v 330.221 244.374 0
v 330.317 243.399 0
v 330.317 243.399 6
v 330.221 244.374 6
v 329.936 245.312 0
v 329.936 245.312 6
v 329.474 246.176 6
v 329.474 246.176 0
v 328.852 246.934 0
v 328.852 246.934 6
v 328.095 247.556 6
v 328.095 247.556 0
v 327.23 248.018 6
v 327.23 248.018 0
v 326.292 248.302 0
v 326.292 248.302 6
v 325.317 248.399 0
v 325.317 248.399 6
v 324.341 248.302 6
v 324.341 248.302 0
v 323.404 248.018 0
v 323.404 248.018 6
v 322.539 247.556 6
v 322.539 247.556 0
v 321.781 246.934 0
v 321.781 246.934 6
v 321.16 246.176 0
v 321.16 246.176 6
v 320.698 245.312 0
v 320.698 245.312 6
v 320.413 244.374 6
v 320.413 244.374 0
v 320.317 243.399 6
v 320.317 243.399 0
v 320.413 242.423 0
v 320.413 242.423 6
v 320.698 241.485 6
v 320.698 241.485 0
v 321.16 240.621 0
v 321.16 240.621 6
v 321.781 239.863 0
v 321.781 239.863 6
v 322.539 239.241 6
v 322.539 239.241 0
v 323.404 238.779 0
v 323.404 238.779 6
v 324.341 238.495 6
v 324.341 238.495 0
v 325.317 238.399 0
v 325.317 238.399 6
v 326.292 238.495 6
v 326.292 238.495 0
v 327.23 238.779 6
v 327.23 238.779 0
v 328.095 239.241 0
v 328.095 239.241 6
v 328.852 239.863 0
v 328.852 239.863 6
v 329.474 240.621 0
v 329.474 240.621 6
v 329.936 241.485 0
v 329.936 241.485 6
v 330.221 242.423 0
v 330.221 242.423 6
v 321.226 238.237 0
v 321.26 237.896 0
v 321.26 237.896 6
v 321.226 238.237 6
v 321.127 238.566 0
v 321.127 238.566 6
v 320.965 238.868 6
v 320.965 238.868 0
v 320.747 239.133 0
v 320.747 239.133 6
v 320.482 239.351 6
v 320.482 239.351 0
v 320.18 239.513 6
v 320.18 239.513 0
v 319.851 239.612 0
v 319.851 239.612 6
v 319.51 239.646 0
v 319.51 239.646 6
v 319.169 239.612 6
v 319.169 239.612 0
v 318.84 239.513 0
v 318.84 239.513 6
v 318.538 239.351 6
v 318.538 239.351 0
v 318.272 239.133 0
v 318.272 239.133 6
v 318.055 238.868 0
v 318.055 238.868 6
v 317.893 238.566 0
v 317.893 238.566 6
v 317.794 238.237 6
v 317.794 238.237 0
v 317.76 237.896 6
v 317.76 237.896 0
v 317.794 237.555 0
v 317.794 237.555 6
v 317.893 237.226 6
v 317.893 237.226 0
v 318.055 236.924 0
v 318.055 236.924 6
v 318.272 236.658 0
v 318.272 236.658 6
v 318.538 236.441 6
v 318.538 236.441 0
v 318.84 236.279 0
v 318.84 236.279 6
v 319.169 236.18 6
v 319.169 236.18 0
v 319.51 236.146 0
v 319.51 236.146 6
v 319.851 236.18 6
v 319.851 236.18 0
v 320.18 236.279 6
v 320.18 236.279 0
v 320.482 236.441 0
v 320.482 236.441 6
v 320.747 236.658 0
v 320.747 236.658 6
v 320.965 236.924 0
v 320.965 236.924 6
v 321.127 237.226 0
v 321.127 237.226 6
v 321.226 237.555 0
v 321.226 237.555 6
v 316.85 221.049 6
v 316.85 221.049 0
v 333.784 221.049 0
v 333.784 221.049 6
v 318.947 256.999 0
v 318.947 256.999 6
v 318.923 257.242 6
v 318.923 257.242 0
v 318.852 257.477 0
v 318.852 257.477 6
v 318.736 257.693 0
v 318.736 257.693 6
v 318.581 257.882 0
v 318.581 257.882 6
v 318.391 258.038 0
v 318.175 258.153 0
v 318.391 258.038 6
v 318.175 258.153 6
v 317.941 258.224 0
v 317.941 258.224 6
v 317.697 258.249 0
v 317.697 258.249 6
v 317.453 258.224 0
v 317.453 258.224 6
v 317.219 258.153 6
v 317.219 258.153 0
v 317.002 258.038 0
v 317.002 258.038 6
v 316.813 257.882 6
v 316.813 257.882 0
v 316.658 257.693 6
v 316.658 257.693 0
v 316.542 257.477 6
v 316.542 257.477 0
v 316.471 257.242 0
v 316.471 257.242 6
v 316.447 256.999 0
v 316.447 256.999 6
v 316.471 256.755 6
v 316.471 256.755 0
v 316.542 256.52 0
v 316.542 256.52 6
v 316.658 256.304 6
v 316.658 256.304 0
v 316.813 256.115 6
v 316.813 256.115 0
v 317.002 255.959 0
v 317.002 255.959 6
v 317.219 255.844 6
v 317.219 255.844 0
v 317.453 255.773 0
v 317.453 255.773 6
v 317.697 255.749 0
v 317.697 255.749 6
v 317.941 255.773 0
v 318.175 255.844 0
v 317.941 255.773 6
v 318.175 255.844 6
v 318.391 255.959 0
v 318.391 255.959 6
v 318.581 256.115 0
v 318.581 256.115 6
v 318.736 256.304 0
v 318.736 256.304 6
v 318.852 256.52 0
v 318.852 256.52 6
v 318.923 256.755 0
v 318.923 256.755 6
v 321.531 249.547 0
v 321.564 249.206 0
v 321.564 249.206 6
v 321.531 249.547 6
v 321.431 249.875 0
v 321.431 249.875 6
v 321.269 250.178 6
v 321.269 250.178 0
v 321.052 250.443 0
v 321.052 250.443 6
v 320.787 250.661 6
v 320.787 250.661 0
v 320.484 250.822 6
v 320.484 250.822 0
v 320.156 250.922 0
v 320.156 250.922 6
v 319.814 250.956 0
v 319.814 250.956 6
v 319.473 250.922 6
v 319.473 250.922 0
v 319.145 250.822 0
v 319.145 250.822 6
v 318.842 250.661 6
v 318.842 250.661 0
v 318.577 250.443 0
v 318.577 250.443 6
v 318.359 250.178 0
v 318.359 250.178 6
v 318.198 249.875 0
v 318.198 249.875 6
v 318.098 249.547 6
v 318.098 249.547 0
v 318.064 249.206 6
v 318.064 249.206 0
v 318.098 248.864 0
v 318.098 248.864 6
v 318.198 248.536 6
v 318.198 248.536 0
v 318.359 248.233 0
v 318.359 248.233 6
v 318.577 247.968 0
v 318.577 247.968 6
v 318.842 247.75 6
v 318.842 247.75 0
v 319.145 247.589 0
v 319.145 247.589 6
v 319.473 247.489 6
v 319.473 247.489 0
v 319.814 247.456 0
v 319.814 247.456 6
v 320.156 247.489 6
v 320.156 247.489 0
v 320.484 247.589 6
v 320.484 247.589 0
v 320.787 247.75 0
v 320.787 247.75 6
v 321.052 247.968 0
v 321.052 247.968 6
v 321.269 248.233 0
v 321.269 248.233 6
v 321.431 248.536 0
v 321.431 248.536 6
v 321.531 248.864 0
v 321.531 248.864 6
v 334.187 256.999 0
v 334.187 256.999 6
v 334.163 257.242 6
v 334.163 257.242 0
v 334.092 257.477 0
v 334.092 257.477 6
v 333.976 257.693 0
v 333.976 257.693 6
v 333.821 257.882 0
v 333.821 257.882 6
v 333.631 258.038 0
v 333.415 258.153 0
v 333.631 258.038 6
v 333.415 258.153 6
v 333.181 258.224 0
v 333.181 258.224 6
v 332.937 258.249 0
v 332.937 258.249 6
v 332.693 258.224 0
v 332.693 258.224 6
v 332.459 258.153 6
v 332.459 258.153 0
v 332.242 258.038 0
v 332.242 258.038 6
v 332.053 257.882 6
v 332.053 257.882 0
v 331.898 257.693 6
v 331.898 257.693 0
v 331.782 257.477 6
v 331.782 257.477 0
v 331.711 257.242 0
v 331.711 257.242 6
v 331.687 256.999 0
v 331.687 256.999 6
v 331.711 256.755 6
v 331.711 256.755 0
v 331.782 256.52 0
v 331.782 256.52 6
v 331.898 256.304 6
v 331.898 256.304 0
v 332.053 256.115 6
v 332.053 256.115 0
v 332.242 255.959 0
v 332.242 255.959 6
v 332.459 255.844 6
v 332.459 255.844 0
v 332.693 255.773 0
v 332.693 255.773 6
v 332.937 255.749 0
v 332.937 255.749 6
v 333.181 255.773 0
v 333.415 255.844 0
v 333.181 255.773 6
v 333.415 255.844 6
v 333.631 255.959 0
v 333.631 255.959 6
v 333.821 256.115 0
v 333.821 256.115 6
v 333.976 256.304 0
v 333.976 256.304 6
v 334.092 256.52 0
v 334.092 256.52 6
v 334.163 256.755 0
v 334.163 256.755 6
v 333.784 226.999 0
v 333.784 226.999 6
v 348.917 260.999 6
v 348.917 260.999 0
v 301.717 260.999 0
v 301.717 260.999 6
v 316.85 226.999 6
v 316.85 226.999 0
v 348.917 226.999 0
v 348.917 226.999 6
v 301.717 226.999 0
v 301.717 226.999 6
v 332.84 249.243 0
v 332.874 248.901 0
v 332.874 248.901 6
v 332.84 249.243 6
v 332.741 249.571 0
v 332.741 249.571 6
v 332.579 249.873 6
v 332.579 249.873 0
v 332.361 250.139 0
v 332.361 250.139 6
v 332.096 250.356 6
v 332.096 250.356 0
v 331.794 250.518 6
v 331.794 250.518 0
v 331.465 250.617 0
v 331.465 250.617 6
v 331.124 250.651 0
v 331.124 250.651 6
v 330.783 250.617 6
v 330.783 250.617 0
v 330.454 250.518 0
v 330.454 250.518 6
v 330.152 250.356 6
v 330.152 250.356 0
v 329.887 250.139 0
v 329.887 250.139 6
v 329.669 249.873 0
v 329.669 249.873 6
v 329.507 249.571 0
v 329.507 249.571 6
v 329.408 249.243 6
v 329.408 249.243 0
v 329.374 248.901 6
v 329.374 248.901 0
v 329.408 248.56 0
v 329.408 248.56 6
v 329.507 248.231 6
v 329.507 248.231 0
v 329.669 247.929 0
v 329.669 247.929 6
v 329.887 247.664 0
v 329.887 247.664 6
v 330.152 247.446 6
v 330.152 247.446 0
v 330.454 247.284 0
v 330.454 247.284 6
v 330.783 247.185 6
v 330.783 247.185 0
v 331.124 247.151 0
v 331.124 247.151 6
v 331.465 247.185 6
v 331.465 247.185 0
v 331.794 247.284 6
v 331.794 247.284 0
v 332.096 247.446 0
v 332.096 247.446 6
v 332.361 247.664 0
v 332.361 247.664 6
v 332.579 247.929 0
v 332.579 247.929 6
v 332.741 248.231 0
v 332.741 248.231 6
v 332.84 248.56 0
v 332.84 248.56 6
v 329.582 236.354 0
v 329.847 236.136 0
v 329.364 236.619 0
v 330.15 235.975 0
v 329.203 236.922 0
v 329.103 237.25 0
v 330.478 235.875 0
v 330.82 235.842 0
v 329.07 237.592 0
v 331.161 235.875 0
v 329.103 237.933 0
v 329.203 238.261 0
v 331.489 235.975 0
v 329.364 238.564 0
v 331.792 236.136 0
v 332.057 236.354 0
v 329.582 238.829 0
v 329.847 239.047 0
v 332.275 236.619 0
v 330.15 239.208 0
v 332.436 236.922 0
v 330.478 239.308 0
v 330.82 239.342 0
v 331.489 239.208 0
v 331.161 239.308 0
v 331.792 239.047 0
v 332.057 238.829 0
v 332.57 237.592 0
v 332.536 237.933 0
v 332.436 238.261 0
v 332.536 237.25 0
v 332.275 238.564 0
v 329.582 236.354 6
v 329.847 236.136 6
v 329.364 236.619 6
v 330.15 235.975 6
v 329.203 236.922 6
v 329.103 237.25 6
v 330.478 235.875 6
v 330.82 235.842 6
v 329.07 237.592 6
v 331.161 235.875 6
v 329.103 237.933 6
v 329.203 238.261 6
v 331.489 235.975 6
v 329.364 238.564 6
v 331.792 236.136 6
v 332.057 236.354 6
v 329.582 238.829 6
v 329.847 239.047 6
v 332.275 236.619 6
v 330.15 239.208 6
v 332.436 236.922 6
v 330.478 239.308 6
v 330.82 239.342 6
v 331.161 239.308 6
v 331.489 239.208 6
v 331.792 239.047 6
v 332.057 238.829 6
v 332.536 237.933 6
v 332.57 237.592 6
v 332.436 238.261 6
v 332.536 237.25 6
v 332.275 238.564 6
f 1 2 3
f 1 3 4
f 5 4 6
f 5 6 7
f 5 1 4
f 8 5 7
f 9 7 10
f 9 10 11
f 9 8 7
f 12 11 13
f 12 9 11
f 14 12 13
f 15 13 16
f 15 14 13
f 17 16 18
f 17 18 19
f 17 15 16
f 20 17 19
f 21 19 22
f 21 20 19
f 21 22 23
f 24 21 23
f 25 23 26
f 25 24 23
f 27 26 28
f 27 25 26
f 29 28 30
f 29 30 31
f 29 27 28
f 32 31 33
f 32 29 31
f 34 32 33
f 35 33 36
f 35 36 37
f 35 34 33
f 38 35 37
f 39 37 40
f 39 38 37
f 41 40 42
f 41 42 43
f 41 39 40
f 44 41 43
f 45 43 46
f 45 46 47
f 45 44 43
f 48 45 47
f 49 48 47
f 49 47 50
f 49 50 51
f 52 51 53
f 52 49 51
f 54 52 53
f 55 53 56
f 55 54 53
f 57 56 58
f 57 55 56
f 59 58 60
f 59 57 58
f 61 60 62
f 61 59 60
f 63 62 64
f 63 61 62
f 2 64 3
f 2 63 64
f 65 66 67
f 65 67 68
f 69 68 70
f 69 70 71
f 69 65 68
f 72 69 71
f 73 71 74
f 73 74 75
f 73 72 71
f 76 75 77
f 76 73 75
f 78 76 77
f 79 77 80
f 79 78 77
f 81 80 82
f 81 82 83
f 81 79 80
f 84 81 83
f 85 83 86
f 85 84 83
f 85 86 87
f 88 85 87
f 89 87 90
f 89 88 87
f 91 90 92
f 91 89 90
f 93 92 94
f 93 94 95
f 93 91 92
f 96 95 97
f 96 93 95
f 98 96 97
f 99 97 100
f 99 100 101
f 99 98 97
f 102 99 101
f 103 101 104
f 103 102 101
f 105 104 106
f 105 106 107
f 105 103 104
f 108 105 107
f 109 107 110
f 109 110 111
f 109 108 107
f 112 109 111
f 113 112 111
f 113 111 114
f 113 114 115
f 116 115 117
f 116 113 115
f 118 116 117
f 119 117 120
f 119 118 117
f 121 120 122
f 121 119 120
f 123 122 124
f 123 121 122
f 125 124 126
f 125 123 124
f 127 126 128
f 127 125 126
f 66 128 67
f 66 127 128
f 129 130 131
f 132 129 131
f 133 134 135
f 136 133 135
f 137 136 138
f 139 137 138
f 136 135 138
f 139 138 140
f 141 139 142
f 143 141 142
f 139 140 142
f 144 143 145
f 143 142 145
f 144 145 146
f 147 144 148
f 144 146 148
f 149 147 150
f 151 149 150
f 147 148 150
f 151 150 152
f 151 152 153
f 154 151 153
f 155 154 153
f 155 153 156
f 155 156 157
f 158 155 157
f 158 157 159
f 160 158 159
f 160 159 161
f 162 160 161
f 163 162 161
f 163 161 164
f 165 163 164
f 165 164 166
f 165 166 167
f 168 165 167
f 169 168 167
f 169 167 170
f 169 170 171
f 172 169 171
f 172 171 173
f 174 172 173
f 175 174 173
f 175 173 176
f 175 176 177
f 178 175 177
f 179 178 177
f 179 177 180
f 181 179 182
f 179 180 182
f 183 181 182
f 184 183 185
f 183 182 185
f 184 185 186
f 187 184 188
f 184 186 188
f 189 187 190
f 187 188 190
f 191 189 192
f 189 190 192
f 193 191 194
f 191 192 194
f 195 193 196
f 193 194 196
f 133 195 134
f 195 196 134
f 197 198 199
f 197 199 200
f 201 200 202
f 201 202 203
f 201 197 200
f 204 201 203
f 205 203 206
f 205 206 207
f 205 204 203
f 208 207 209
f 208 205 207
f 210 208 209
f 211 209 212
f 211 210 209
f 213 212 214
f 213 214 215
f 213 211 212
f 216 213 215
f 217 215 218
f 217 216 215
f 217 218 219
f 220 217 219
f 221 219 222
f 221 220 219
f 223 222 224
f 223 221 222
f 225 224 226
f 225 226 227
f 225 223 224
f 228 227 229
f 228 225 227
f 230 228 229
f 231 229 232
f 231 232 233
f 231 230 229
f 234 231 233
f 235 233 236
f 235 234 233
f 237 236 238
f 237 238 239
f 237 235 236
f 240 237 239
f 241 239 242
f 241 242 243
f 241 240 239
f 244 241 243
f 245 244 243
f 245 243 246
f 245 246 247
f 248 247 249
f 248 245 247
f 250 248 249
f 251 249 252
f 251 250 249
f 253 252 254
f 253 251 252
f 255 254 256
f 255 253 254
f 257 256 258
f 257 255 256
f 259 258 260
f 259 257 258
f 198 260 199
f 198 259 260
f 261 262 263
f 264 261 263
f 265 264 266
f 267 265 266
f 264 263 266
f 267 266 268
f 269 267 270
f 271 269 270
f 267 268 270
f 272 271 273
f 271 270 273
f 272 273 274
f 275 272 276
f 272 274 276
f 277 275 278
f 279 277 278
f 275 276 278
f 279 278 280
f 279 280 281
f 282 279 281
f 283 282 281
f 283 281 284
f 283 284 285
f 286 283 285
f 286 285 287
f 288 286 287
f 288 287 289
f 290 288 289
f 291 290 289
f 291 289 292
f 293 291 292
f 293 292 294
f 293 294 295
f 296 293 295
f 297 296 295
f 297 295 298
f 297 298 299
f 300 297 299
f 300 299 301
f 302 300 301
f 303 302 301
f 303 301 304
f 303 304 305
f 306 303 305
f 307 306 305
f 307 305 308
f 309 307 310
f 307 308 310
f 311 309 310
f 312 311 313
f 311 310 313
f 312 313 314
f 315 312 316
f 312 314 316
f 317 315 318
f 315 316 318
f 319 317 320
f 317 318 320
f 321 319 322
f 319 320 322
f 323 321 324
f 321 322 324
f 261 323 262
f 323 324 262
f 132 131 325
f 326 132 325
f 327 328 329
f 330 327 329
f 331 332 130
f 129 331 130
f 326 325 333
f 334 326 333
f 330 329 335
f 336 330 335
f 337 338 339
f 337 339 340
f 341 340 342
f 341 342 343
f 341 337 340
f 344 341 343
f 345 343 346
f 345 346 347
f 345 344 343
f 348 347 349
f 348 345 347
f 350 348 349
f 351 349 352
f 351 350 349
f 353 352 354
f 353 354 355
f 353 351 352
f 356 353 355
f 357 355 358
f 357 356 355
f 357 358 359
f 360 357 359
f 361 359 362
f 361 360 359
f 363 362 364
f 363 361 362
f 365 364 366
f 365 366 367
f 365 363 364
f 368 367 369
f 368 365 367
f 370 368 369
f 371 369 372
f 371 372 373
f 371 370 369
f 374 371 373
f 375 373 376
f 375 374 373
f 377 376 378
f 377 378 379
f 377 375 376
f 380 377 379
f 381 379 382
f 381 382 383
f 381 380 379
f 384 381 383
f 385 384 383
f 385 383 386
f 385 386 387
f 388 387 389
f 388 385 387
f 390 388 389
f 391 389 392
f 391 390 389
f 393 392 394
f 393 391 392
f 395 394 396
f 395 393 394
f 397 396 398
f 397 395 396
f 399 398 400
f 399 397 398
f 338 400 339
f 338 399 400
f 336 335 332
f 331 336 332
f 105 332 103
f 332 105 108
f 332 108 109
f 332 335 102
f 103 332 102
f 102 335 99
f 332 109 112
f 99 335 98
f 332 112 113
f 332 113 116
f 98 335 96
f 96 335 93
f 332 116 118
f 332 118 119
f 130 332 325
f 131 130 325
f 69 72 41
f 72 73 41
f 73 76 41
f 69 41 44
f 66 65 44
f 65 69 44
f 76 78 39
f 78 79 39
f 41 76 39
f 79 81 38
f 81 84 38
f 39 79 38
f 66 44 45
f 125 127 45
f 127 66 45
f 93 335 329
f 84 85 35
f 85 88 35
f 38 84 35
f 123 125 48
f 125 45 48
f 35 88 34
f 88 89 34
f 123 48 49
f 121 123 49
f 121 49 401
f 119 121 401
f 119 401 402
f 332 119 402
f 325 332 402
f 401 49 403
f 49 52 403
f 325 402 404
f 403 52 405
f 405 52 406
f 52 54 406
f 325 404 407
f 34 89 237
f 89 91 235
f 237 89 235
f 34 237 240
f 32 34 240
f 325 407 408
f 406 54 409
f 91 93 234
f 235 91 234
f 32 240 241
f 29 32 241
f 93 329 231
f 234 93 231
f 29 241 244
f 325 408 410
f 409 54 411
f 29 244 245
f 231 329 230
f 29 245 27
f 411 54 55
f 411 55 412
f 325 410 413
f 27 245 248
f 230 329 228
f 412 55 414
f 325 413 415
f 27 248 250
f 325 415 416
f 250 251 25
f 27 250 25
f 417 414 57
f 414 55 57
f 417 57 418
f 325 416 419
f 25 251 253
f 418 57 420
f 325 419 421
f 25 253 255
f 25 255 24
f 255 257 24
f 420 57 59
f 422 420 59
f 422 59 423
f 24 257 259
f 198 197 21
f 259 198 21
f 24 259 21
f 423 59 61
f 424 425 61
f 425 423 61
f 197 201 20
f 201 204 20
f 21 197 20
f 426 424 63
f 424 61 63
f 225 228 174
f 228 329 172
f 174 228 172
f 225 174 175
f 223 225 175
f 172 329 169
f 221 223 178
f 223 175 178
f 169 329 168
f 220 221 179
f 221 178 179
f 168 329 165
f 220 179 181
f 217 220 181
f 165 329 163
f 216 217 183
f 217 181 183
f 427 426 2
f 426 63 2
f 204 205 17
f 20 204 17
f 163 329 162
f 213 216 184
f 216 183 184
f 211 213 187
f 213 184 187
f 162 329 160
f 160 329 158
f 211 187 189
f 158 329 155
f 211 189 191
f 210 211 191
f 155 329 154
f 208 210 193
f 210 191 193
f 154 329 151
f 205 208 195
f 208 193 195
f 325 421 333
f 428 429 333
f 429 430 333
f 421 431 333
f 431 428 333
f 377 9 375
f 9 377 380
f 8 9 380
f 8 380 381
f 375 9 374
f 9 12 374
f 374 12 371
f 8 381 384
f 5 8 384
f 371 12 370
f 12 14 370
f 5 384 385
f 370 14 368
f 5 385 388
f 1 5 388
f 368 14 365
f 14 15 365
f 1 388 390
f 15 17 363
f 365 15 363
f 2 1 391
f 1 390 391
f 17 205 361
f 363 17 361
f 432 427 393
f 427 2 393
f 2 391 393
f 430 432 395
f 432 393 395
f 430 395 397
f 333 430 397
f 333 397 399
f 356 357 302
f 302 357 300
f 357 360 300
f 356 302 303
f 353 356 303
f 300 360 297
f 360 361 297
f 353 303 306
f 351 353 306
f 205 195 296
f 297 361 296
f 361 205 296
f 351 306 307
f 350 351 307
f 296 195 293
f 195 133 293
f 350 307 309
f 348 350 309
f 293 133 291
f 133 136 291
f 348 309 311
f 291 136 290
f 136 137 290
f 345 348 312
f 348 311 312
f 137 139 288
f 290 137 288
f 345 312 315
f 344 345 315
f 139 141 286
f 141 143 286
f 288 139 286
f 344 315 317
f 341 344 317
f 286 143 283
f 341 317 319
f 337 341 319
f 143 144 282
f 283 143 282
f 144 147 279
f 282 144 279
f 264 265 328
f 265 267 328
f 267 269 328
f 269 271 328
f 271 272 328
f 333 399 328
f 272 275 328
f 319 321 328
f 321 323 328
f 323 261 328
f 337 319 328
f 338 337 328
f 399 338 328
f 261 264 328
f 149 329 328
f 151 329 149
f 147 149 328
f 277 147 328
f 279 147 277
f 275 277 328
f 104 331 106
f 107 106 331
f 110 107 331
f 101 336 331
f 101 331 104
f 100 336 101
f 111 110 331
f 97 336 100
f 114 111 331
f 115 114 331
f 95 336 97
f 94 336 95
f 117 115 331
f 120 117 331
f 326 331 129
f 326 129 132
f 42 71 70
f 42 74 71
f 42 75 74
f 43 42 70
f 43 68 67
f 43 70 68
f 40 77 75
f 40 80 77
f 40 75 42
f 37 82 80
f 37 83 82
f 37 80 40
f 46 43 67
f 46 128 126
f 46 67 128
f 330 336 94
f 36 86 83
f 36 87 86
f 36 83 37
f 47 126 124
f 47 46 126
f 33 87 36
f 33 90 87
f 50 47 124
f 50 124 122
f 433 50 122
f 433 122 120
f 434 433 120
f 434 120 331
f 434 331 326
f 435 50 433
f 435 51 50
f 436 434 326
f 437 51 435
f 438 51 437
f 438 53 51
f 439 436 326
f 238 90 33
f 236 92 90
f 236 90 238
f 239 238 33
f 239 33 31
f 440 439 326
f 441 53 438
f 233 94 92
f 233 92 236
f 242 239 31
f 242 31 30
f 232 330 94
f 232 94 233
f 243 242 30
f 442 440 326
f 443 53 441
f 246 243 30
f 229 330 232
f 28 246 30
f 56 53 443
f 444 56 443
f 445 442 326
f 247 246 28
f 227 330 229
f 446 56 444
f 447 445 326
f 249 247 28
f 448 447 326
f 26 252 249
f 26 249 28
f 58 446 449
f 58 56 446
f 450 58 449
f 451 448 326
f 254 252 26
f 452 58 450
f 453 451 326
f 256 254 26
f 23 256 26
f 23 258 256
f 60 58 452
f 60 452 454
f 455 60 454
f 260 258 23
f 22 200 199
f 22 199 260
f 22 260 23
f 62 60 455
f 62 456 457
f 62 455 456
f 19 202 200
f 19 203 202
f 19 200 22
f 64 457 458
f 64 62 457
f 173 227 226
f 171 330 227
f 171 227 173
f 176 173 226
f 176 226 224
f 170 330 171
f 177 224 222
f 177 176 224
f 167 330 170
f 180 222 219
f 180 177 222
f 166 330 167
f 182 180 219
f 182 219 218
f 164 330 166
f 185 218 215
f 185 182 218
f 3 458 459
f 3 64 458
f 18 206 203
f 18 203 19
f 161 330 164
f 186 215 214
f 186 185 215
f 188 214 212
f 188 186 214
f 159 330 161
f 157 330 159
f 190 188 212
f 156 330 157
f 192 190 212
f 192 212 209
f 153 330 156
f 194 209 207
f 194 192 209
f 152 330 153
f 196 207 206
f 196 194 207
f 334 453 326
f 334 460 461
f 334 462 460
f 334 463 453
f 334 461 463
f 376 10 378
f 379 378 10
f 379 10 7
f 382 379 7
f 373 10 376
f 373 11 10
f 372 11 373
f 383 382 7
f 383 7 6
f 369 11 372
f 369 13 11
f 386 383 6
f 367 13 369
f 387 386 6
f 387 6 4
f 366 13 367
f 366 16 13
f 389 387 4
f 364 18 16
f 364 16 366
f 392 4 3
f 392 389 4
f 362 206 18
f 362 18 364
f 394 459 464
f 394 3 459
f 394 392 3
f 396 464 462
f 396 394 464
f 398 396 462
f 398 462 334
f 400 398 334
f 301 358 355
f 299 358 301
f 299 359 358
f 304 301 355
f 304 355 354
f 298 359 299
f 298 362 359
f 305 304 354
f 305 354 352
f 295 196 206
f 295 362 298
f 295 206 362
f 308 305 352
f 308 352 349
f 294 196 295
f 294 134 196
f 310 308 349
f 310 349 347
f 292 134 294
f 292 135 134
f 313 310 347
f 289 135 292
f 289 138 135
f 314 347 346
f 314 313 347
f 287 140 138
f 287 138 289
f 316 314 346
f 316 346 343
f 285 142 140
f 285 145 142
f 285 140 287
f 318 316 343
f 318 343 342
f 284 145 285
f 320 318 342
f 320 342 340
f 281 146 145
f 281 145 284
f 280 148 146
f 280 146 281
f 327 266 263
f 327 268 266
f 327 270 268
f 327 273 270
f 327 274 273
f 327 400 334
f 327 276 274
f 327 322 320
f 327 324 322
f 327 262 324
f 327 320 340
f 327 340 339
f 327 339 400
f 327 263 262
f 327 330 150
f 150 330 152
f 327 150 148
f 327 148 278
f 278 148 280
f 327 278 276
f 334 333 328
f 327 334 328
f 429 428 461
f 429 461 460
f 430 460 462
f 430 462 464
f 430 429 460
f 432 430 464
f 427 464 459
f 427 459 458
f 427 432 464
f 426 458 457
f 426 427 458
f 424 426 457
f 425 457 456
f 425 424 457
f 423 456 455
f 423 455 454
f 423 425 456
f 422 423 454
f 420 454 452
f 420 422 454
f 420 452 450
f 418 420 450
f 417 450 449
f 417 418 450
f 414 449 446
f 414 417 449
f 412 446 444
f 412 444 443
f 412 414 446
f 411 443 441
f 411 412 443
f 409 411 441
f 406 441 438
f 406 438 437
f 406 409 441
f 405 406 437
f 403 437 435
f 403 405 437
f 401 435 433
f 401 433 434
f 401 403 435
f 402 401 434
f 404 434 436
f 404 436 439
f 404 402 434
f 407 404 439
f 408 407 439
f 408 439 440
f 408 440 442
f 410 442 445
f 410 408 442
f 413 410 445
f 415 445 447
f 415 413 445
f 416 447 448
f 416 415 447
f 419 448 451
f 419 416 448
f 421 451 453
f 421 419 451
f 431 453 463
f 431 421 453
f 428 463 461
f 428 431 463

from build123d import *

# Parameters (mm, degrees)
SKETCH1_R           = 5
SKETCH1_R_2         = 1.75
BOSS_EXTRUDE1_DEPTH = 6
CUT_EXTRUDE1_REACH  = 8
SKETCH2_R           = 1.25


with BuildPart() as part:
    # Sketch1 → Boss-Extrude1 (new body)
    with BuildSketch(Plane.XY):
        Polygon((348.916937196, 226.998518154), (348.916937196, 260.998518154), (301.716937196, 260.998518154), (301.716937196, 226.998518154), (316.850270529, 226.998518154), (316.850270529, 221.04907787), (333.783603862, 221.04907787), (333.783603862, 226.998518154), align=None)
        with Locations((325.316937196, 243.398518154)):
            Circle(SKETCH1_R, mode=Mode.SUBTRACT)
        with Locations((331.123946249, 248.901121707)):
            Circle(SKETCH1_R_2, mode=Mode.SUBTRACT)
        with Locations((319.814333643, 249.205527207)):
            Circle(SKETCH1_R_2, mode=Mode.SUBTRACT)
        with Locations((319.509928143, 237.895914601)):
            Circle(SKETCH1_R_2, mode=Mode.SUBTRACT)
        with Locations((330.819540748, 237.591509101)):
            Circle(SKETCH1_R_2, mode=Mode.SUBTRACT)
    extrude(amount=BOSS_EXTRUDE1_DEPTH)

    # Sketch2 → Cut-Extrude1 (cut, up to next)
    with BuildSketch(Plane.XY.offset(6), mode=Mode.PRIVATE) as cut_extrude1_sk1:
        with Locations((317.696937196, 256.998518154)):
            Circle(SKETCH2_R)
    cut_extrude1_tool1 = extrude(cut_extrude1_sk1.sketch, amount=-CUT_EXTRUDE1_REACH, mode=Mode.PRIVATE) & part.part
    add(cut_extrude1_tool1.solids().sort_by_distance((317.696937, 256.998518, 6))[0], mode=Mode.SUBTRACT)
    # Sketch2 → Cut-Extrude1 (cut, up to next)
    with BuildSketch(Plane.XY.offset(6), mode=Mode.PRIVATE) as cut_extrude1_sk2:
        with Locations((332.936937196, 256.998518154)):
            Circle(SKETCH2_R)
    cut_extrude1_tool2 = extrude(cut_extrude1_sk2.sketch, amount=-CUT_EXTRUDE1_REACH, mode=Mode.PRIVATE) & part.part
    add(cut_extrude1_tool2.solids().sort_by_distance((332.936937, 256.998518, 6))[0], mode=Mode.SUBTRACT)


solid = part.part
